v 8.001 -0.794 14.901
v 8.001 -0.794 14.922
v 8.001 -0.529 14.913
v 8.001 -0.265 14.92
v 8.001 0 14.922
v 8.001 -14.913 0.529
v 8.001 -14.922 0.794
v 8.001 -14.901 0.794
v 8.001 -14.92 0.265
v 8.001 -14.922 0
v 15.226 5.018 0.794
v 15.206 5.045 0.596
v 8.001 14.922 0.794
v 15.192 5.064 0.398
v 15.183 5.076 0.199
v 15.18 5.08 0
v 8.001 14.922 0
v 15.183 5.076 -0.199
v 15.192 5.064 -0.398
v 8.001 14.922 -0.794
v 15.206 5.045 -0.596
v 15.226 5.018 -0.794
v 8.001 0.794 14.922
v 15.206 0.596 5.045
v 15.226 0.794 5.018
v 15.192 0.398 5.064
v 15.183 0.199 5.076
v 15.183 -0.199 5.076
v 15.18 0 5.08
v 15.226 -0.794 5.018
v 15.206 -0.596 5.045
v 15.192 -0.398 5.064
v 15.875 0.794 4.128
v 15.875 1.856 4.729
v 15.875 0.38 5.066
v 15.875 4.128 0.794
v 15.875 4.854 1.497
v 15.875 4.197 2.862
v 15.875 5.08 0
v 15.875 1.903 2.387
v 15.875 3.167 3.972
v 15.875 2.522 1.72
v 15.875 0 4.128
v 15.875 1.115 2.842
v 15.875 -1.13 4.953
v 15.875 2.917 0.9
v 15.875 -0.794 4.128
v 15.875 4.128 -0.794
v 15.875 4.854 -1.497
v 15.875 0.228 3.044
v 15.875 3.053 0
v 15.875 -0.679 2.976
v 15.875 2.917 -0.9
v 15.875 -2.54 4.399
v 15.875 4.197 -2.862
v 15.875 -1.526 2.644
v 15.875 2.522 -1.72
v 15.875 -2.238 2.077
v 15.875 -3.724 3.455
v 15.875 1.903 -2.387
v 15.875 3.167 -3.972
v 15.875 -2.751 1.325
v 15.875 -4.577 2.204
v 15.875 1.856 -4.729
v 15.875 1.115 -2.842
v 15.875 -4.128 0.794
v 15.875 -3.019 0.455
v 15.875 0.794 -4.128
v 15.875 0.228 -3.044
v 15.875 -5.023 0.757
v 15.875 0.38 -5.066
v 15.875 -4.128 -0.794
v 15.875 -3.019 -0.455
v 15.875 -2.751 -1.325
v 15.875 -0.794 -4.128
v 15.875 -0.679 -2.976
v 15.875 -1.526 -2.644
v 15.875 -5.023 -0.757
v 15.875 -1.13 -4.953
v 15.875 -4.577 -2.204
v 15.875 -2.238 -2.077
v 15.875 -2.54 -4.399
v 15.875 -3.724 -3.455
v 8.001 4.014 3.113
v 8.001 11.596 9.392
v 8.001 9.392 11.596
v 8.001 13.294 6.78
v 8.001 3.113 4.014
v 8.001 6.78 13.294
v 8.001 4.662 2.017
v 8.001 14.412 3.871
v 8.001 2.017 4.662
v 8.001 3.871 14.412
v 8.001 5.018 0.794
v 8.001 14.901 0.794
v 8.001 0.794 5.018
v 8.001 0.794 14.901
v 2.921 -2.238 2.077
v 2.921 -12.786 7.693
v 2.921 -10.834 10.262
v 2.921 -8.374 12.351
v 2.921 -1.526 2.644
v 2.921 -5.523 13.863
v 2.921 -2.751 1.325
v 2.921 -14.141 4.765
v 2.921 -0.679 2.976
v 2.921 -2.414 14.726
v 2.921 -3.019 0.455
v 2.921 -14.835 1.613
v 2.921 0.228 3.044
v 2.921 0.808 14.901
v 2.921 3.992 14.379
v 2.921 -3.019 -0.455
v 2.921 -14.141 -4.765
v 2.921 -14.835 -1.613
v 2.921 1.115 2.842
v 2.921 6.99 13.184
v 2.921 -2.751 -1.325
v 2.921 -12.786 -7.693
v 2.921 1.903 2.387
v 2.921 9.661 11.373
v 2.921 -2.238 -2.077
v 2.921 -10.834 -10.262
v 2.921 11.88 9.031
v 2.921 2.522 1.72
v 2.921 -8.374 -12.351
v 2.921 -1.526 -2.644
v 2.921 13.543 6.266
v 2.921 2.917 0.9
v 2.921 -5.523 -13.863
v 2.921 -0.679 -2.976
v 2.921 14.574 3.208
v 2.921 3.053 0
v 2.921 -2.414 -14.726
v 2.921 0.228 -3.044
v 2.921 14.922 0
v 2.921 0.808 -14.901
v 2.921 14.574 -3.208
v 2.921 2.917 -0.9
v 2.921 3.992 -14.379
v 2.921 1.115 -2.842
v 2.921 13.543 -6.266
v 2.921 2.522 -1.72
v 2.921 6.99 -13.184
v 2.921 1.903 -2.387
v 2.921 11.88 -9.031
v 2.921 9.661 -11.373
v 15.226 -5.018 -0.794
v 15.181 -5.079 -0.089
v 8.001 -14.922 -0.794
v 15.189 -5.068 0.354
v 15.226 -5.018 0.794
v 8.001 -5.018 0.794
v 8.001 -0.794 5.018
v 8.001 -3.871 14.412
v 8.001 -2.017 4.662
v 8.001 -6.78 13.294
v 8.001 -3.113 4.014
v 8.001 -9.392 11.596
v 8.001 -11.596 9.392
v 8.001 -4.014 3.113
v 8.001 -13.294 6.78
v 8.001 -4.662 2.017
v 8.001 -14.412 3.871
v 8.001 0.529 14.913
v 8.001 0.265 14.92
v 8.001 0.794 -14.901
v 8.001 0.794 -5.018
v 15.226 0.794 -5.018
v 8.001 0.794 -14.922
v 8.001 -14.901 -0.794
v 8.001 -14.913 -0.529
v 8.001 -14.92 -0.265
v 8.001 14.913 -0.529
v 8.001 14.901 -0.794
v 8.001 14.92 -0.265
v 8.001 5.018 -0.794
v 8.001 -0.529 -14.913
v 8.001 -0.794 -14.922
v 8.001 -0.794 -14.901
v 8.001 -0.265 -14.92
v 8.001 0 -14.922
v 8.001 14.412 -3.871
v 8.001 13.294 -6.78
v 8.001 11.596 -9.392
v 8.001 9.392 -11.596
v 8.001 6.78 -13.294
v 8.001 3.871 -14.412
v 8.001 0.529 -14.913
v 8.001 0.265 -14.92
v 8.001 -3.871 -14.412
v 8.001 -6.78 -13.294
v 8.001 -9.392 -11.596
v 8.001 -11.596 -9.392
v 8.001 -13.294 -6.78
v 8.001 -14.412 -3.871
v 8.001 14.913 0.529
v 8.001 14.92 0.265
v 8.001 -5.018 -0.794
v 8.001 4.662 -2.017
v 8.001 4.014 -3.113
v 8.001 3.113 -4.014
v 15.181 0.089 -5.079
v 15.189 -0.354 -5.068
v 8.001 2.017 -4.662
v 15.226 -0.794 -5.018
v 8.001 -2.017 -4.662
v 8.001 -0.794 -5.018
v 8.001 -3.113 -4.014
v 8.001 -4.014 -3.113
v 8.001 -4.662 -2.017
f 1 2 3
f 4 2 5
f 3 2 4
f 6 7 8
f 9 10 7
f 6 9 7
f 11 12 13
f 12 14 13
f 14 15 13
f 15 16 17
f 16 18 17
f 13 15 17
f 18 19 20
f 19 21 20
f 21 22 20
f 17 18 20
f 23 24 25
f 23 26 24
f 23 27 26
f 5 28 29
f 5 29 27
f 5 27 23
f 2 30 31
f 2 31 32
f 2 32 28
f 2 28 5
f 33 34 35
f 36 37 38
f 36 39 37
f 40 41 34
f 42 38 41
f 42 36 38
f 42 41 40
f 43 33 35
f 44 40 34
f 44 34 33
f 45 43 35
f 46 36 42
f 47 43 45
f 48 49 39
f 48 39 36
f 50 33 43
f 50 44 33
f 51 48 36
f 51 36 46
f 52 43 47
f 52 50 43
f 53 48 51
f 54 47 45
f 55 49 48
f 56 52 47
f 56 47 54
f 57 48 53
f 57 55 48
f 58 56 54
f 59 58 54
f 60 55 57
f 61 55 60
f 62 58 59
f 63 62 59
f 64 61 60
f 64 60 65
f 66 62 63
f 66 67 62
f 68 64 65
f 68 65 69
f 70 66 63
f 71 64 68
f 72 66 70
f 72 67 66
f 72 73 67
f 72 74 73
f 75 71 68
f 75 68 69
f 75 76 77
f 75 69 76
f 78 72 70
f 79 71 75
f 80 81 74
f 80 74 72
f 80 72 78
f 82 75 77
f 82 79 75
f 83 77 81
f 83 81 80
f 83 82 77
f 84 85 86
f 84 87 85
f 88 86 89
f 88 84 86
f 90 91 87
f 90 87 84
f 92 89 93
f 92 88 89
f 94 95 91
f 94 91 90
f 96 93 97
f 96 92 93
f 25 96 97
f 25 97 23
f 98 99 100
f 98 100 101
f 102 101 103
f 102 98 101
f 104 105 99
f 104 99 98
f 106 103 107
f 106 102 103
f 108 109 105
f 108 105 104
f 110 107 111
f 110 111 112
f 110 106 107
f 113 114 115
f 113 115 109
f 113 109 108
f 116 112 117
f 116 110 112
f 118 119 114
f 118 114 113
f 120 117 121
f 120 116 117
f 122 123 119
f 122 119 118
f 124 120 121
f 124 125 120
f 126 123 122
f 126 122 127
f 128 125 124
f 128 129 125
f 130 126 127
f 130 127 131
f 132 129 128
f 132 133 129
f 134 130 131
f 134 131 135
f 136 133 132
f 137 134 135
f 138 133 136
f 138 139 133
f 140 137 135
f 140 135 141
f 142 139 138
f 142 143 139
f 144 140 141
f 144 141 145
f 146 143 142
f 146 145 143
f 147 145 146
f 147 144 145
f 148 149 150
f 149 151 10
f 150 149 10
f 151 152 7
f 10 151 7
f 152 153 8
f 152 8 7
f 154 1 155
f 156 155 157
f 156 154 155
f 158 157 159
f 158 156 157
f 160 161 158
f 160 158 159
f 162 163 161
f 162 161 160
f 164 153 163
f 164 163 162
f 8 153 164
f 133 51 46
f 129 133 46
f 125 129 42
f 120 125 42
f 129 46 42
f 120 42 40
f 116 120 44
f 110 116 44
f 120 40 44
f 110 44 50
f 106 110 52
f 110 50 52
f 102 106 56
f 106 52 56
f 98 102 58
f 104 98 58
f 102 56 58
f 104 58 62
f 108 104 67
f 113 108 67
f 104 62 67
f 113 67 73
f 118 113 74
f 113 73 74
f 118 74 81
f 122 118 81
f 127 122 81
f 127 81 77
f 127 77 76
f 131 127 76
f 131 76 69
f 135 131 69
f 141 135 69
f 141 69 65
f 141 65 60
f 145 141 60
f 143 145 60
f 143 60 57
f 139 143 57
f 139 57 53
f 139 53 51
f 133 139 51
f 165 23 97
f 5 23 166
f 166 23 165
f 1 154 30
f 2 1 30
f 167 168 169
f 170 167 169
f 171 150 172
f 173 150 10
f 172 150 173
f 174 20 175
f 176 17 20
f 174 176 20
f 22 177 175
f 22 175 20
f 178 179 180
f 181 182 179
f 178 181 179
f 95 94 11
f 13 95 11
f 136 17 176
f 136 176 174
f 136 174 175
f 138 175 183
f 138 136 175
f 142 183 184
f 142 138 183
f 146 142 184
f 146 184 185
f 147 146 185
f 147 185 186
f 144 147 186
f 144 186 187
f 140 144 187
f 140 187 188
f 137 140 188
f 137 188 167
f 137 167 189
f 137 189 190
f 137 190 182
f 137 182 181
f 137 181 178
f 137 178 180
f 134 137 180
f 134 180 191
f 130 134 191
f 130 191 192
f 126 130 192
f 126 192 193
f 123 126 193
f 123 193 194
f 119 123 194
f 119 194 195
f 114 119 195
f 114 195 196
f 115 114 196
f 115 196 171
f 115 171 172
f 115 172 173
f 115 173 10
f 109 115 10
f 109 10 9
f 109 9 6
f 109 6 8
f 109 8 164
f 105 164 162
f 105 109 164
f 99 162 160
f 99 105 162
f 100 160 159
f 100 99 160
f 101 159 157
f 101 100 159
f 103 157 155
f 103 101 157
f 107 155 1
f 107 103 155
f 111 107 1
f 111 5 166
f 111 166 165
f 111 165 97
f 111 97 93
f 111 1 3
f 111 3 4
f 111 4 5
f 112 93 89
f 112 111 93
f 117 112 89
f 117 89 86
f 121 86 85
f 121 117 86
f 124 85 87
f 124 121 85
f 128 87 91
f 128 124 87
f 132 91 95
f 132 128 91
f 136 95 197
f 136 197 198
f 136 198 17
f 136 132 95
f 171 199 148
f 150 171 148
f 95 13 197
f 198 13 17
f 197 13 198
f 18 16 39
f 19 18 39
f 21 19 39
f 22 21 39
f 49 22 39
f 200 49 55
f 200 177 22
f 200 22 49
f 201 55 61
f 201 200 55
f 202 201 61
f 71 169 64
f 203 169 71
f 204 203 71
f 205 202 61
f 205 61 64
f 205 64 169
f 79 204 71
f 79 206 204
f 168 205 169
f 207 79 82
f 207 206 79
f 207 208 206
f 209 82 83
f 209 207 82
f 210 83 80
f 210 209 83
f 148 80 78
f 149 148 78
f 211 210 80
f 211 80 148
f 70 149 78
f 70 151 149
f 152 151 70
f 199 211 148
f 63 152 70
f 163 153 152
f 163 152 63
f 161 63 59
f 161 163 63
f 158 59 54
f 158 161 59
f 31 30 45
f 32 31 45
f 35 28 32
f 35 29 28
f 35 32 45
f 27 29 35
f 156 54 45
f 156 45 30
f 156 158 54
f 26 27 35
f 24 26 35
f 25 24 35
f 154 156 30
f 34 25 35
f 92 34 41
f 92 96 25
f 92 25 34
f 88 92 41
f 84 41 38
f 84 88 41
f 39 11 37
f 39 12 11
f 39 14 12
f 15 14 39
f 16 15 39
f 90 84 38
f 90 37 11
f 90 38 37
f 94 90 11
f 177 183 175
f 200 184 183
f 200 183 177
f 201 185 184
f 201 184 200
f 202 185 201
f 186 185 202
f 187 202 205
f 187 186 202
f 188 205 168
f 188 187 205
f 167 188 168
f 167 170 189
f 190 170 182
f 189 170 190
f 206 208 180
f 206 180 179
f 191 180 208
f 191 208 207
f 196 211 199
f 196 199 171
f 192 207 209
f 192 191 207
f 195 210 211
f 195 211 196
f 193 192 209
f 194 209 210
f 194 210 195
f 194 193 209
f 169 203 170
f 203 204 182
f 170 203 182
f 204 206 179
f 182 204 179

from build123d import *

# Parameters (mm, degrees)
F2_R            = 3.0529538636
F3_DEPTH        = 15.875
F5_DEPTH        = 0.79375
F5_DEPTH_BACK   = 0.79375
F5_COPIES_COUNT = 4
F6_R            = 3.175
F7_DEPTH        = 2.921


# Not quite as in the source:
# - a pattern or mirror of a feature is missing from the dataset's text; its kind, count and spacing are read off the source's solid


with BuildPart() as f1:
    # F0 (on Top) → F1 (revolve)
    with BuildSketch(Plane.XY):
        Polygon((0, 3.175), (0, 0), (15.875, 0), (15.875, 5.08), (8.001, 5.08), (8.001, 14.9225), (2.921, 14.9225), (2.921, 3.175), align=None)
    revolve(axis=Axis((7.9375, 0, 0), (-1, 0, 0)))

    # F2 (on face) → F3 (cut, through all)
    with BuildSketch(Plane.YZ.offset(15.875)):
        Circle(F2_R)
    extrude(amount=-F3_DEPTH, mode=Mode.SUBTRACT)

    # F4 (on Front) → F5 (join, two sides)
    with BuildSketch(Plane.XZ) as f5_sk:
        Polygon((15.875, 4.1275), (8.001, 14.9225), (8.001, 4.1275), align=None)
    f5 = extrude(amount=F5_DEPTH) + extrude(f5_sk.sketch, amount=-F5_DEPTH_BACK)

    # F5_copies: F5 ×4 about axis
    f5_copies_axis = Axis((0, 0, 0), (1, 0, 0))
    for i in range(1, F5_COPIES_COUNT):
        add(f5.rotate(f5_copies_axis, i * 360 / F5_COPIES_COUNT))

    # F6 (on face) → F7 (cut, through all)
    with BuildSketch(Plane(origin=(0, 0, 0), x_dir=(0, -1, 0), z_dir=(-1, 0, 0))):
        Circle(F6_R)
    extrude(amount=-F7_DEPTH, mode=Mode.SUBTRACT)


solid = f1.part
